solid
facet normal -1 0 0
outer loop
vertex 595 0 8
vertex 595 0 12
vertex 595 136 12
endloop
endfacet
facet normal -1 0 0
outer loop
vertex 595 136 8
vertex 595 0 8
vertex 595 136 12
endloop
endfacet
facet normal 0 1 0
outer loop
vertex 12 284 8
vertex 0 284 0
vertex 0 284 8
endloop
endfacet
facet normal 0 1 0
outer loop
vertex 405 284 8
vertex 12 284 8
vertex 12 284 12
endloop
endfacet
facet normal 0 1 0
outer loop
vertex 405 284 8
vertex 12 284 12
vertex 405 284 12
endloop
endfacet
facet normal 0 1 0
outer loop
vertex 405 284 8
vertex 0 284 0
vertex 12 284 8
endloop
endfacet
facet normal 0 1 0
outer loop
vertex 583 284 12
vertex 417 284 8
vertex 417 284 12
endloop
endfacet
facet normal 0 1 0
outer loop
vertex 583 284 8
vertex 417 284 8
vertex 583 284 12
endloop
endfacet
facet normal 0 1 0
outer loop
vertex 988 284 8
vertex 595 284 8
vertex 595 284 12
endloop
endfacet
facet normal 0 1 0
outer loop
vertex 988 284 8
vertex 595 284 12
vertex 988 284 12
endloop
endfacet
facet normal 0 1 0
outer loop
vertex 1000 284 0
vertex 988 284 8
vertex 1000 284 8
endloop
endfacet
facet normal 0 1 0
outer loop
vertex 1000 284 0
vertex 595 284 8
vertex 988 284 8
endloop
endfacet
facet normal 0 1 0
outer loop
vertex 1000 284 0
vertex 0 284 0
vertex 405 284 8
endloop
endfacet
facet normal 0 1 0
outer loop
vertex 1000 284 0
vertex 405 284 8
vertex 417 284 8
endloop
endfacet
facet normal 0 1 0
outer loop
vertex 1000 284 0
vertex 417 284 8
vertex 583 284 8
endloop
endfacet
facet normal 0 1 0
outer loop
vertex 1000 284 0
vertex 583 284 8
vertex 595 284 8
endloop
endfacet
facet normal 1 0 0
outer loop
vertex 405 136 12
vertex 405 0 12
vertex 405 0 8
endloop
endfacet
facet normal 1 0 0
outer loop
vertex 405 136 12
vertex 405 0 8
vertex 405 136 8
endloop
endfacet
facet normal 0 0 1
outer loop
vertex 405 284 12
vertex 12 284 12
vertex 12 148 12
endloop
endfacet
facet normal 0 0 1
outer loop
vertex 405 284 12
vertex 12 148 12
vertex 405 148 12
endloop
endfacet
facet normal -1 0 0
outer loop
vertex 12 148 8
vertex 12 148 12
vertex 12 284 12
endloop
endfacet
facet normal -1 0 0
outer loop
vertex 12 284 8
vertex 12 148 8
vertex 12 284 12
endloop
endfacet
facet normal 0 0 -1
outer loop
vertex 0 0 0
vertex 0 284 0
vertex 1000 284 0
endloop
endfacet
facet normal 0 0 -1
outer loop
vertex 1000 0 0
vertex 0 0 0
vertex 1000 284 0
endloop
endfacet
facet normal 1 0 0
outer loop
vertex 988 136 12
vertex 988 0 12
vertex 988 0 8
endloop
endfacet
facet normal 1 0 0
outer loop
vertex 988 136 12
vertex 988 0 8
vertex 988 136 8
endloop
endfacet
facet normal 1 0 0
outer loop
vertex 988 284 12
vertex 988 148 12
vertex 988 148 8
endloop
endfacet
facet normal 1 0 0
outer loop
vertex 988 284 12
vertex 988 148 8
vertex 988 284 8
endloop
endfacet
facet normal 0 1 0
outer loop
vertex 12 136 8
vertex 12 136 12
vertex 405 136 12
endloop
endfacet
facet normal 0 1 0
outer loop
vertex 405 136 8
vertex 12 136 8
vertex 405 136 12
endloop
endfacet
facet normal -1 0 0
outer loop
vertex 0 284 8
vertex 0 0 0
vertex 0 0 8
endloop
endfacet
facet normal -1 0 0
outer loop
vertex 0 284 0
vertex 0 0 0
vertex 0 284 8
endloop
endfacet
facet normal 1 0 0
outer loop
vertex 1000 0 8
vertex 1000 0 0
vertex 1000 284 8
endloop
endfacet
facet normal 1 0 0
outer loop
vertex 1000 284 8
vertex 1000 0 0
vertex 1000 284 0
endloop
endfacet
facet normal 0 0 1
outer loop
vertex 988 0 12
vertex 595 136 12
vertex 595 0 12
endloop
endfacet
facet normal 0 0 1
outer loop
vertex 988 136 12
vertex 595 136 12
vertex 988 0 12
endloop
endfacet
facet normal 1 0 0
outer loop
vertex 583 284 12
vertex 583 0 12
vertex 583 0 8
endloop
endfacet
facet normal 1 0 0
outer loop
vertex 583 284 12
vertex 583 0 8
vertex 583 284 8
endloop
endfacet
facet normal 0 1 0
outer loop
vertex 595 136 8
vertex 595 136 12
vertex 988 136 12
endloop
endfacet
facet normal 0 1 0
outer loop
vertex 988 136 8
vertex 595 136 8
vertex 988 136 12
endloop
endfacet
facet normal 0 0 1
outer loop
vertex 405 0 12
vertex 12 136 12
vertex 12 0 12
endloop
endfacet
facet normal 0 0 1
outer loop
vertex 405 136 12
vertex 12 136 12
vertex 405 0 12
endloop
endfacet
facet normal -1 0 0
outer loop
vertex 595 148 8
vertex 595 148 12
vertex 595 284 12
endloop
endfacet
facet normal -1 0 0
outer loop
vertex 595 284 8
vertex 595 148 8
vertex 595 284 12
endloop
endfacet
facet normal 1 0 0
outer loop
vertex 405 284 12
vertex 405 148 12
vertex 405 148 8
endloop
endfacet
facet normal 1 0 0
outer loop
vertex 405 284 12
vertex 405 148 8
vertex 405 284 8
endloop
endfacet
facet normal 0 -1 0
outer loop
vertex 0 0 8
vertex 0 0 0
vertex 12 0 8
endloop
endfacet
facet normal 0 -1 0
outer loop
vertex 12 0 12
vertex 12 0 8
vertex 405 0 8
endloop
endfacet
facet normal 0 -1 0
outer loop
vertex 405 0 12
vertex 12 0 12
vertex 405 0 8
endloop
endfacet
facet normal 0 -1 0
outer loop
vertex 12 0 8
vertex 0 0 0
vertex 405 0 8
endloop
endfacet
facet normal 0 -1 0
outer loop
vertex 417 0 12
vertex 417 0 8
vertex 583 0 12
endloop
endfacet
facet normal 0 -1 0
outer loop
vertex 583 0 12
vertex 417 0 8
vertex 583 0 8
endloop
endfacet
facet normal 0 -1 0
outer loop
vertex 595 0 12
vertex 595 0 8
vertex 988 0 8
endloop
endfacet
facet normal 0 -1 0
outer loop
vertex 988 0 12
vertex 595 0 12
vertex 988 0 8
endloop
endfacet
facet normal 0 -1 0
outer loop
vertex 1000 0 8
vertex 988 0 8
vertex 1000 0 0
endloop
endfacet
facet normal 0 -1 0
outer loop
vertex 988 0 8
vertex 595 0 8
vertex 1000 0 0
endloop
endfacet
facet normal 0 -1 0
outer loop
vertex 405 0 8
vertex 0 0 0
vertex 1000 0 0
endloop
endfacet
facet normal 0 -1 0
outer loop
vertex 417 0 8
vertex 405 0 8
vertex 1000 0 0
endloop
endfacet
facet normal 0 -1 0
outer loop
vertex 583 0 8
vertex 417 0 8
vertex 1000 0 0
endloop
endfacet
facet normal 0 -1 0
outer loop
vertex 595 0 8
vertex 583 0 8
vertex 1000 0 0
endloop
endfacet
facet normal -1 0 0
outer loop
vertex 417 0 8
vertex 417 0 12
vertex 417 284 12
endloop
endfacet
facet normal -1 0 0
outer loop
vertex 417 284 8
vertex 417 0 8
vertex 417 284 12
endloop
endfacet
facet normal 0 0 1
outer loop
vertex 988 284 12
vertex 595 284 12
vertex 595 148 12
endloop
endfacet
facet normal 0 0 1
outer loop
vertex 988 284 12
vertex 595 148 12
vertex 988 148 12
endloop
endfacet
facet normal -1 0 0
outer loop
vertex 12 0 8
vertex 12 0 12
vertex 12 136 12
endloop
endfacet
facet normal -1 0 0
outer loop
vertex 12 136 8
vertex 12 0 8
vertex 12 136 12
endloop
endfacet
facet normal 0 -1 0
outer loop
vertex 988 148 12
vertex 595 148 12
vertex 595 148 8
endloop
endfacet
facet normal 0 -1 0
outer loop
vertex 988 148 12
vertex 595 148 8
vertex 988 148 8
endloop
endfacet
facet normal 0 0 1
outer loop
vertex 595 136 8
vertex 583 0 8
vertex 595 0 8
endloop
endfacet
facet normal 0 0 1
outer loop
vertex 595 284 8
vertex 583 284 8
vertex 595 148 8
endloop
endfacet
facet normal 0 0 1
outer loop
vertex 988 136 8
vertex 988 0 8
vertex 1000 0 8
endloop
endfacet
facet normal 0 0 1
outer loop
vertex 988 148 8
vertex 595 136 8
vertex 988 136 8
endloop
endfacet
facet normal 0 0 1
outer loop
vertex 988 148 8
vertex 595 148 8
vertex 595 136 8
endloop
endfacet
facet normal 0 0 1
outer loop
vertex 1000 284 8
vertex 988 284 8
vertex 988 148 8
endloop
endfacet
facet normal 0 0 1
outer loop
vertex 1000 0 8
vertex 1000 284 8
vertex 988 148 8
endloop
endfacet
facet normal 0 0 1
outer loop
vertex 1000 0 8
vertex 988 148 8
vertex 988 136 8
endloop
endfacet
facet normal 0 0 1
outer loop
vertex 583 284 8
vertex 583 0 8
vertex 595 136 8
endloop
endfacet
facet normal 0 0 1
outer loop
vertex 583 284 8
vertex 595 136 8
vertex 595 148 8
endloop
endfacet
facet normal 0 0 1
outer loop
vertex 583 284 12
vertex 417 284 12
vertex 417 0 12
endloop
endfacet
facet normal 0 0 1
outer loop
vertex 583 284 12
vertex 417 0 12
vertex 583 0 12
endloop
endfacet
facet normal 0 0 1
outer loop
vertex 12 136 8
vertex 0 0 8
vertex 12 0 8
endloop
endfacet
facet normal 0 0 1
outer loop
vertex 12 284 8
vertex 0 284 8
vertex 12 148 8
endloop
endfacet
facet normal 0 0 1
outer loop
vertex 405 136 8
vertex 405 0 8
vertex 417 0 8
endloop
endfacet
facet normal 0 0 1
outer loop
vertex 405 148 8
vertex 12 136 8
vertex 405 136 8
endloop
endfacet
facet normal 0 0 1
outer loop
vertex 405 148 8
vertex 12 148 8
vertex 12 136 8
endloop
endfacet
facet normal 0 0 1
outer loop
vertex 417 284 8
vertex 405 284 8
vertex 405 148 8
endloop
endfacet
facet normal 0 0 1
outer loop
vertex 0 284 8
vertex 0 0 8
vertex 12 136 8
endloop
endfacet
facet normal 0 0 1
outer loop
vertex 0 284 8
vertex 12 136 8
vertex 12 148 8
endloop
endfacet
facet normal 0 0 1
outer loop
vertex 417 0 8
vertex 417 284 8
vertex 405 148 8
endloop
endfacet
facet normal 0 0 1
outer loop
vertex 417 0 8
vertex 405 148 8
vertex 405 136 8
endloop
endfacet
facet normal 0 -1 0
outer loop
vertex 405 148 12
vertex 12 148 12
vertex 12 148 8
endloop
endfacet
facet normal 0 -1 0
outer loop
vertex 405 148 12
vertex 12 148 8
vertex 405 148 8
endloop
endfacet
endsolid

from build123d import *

# Parameters (mm, degrees)
PANEL_W                      = 1000
PANEL_H                      = 284
PANEL_PLY_DEPTH              = 12
SKETCH2_W                    = 12
SKETCH2_H                    = 284
VERTICAL_HOUSING_CUT_DEPTH   = 4
SKETCH3_W                    = 393
SKETCH3_H                    = 12
HORIZONTAL_HOUSING_CUT_DEPTH = 4


with BuildPart() as part:
    # Panel → Panel Ply (new body)
    with BuildSketch(Plane.XY):
        with Locations((500, 142)):
            Rectangle(PANEL_W, PANEL_H)
    extrude(amount=PANEL_PLY_DEPTH)

    # Sketch2 → Vertical Housing Cut (cut)
    with BuildSketch(Plane.XY.offset(12)):
        with Locations((6, 142)):
            Rectangle(SKETCH2_W, SKETCH2_H)
        with Locations((994, 142)):
            Rectangle(SKETCH2_W, SKETCH2_H)
        with Locations((411, 142)):
            Rectangle(SKETCH2_W, SKETCH2_H)
        with Locations((589, 142)):
            Rectangle(SKETCH2_W, SKETCH2_H)
    extrude(amount=-VERTICAL_HOUSING_CUT_DEPTH, mode=Mode.SUBTRACT)

    # Sketch3 → Horizontal Housing Cut (cut)
    with BuildSketch(Plane.XY.offset(12)):
        with Locations((208.5, 142)):
            Rectangle(SKETCH3_W, SKETCH3_H)
        with Locations((791.5, 142)):
            Rectangle(SKETCH3_W, SKETCH3_H)
    extrude(amount=-HORIZONTAL_HOUSING_CUT_DEPTH, mode=Mode.SUBTRACT)


solid = part.part
